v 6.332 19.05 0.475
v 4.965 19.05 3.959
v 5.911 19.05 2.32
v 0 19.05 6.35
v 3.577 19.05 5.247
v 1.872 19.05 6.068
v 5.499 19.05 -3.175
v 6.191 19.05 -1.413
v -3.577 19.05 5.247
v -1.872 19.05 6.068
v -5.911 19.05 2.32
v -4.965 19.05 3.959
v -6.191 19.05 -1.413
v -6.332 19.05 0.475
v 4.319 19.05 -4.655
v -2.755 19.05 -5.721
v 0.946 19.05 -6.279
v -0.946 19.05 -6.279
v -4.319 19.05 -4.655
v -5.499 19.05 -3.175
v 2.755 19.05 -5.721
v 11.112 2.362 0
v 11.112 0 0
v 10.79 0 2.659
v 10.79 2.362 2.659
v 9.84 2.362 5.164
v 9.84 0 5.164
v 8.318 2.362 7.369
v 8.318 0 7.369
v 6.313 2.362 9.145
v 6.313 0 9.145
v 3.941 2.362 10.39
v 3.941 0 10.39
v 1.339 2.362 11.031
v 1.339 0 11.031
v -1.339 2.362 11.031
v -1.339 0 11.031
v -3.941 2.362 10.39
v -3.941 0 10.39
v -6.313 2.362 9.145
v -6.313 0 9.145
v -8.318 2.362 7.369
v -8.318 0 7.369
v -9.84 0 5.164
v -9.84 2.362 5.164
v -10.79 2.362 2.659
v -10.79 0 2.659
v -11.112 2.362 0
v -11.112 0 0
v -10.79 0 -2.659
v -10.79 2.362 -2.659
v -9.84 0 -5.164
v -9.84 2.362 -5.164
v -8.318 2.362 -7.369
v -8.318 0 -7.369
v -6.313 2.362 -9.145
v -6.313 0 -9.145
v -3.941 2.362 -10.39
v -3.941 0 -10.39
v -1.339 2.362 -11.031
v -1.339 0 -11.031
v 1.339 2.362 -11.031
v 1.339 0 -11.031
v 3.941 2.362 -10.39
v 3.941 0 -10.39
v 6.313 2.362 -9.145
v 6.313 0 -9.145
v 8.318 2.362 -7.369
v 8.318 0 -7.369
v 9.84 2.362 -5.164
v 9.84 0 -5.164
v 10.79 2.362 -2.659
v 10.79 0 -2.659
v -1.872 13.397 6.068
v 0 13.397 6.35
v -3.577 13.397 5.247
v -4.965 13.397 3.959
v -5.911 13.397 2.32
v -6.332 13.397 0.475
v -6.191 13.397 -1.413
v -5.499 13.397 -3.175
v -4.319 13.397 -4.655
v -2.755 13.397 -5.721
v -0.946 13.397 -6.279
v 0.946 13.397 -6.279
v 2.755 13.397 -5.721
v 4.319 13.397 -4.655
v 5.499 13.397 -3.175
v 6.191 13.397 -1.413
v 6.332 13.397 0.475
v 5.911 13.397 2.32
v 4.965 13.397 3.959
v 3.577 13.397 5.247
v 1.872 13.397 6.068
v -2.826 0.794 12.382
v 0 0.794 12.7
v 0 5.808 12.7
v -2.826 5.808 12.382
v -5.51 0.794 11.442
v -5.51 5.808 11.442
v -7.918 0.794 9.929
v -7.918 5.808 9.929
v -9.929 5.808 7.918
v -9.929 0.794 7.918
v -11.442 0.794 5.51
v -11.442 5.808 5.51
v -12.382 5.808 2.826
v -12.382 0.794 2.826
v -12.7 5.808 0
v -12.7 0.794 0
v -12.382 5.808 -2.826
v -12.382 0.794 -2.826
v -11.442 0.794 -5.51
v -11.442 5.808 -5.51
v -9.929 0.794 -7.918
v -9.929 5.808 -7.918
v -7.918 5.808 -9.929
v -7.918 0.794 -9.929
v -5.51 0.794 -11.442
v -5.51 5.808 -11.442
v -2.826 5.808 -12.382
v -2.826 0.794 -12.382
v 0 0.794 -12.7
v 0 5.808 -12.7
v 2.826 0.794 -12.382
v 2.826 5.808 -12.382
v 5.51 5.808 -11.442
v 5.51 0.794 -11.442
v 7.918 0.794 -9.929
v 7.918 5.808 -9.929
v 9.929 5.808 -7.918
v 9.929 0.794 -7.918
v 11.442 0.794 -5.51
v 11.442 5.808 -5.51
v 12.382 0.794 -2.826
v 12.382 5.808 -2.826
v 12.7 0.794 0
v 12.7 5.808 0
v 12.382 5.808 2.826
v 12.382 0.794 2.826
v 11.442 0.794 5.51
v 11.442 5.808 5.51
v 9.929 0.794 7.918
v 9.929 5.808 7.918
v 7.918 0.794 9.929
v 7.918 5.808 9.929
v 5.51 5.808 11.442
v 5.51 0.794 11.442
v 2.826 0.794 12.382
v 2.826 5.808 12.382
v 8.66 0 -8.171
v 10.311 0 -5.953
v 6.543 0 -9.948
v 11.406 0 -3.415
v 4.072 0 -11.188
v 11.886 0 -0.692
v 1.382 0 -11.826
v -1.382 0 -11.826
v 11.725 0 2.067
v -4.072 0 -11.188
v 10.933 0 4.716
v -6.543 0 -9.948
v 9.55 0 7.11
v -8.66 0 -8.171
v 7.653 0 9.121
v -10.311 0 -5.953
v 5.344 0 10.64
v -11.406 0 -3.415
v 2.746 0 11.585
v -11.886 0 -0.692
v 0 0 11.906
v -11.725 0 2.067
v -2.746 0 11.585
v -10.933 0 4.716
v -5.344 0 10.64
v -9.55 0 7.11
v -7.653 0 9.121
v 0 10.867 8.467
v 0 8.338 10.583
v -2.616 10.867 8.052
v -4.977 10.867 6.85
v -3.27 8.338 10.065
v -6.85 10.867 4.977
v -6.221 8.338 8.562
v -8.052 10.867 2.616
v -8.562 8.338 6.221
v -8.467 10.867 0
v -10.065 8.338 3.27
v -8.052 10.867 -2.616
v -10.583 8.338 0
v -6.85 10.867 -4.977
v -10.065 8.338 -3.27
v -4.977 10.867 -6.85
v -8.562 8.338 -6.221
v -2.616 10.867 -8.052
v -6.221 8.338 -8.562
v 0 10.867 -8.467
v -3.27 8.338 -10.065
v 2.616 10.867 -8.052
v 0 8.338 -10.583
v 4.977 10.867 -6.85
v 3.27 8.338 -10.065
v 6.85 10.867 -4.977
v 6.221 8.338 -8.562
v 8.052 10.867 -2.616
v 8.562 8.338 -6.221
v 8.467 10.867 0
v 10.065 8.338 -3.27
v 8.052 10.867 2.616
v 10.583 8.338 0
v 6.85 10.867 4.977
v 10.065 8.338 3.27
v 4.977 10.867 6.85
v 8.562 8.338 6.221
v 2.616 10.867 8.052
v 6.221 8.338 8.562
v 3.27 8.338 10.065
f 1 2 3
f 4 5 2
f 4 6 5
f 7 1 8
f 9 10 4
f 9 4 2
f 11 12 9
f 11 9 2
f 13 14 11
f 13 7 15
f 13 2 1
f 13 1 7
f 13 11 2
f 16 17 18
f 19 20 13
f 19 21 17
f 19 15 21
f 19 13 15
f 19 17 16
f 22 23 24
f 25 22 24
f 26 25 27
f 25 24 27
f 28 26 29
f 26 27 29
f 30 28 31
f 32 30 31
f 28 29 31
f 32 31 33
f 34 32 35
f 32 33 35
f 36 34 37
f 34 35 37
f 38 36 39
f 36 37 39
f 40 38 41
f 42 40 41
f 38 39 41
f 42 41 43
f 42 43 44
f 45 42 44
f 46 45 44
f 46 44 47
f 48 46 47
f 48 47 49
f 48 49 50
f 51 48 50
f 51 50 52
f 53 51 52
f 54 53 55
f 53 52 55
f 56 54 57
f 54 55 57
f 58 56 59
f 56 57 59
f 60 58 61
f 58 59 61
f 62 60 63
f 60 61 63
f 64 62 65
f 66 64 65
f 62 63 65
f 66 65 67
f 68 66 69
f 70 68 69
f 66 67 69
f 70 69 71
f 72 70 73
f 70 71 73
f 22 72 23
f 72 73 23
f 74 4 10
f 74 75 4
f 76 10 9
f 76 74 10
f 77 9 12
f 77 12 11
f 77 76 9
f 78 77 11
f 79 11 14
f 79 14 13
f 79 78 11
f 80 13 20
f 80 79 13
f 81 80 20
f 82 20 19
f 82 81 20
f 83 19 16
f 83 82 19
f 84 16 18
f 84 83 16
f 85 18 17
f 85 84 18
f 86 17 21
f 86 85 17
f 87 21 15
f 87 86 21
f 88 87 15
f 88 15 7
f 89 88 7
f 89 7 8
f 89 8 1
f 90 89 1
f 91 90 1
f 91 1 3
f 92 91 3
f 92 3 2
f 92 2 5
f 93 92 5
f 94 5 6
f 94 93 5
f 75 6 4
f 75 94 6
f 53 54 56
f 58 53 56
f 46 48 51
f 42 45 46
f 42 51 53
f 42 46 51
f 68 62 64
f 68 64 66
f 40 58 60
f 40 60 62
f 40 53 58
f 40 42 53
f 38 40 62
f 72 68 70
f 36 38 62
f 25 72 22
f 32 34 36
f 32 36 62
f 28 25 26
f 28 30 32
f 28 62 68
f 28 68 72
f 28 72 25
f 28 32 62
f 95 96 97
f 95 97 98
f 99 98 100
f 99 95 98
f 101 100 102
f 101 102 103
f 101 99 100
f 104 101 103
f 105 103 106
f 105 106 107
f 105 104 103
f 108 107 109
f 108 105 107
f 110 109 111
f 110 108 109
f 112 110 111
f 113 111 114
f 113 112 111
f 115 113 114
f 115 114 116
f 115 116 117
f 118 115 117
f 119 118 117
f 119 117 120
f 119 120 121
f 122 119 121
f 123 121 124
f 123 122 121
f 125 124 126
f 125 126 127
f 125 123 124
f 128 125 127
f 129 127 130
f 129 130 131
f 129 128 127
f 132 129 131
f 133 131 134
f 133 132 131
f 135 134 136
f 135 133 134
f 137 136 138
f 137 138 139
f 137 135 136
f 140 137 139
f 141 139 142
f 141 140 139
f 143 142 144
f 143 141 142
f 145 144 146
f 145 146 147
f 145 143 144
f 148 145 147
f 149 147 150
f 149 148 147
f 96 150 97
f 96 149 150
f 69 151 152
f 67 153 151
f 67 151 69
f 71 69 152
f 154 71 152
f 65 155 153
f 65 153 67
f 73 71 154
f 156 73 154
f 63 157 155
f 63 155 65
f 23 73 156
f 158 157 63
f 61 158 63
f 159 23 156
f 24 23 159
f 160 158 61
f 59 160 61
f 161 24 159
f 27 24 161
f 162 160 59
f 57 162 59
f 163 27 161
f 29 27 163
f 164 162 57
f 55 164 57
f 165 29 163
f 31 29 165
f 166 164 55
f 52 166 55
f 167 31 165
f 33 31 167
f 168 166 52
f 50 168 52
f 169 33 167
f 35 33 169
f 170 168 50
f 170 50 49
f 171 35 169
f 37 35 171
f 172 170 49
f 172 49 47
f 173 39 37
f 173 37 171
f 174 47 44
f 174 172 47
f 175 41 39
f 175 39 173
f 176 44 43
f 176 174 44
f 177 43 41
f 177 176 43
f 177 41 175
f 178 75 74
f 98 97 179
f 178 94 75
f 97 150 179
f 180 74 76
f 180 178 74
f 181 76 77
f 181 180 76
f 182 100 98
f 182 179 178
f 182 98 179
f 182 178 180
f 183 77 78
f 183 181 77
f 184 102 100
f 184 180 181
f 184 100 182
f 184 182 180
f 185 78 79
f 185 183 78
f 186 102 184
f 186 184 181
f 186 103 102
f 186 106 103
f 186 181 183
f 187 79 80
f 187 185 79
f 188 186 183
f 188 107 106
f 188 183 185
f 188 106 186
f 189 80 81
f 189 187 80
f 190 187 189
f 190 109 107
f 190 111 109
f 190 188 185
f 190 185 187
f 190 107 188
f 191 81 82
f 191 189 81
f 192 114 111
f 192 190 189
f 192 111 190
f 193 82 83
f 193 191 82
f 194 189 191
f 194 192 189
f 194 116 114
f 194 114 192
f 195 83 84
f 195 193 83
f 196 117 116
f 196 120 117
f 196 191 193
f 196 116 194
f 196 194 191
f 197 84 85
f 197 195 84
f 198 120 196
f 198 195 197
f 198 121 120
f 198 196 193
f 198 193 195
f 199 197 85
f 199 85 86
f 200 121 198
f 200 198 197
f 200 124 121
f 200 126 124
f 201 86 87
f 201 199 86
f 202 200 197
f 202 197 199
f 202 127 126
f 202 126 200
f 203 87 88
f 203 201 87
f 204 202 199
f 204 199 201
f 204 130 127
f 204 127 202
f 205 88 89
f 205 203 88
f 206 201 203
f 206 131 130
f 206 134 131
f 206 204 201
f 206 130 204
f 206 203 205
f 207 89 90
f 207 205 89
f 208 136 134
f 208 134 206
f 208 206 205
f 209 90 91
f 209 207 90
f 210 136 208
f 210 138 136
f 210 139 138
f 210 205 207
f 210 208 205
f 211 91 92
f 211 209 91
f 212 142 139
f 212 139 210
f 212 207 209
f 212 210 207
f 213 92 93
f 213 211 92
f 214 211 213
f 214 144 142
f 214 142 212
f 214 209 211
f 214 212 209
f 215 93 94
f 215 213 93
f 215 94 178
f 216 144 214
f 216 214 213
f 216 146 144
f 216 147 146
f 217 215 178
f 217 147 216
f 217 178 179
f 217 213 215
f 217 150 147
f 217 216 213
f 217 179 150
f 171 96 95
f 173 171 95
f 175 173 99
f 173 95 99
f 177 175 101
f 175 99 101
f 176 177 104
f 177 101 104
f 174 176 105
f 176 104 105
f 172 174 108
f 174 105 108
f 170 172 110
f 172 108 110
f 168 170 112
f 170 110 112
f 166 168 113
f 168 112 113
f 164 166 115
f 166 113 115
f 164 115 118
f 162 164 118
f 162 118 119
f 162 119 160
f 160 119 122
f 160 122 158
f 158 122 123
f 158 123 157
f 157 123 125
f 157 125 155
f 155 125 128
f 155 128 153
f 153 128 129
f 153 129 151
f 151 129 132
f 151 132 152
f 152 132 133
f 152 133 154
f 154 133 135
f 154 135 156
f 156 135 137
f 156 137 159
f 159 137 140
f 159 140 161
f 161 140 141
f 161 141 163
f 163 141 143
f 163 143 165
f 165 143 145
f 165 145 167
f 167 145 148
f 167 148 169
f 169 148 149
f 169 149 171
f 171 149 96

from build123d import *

# Parameters (mm, degrees)
F2_SIZE  = 0.79375
F3_R     = 11.1125
F4_DEPTH = 2.3622


with BuildPart() as f1:
    # F0 (on Right) → F1 (revolve)
    with BuildSketch(Plane.YZ):
        Polygon((0, 12.7), (0, 0), (19.05, 0), (19.05, 6.35), (13.396951, 6.35), (5.807927, 12.7), align=None)
    revolve(axis=Axis((0, 9.525, 0), (0, -1, 0)))

    # F2
    f2_edges = [f1.edges().sort_by_distance(p)[0] for p in [
        (0, 0, -12.7),
    ]]
    chamfer(f2_edges, length=F2_SIZE)

    # F3 (on face) → F4 (cut)
    with BuildSketch(Plane.XZ):
        Circle(F3_R)
    extrude(amount=-F4_DEPTH, mode=Mode.SUBTRACT)


solid = f1.part
